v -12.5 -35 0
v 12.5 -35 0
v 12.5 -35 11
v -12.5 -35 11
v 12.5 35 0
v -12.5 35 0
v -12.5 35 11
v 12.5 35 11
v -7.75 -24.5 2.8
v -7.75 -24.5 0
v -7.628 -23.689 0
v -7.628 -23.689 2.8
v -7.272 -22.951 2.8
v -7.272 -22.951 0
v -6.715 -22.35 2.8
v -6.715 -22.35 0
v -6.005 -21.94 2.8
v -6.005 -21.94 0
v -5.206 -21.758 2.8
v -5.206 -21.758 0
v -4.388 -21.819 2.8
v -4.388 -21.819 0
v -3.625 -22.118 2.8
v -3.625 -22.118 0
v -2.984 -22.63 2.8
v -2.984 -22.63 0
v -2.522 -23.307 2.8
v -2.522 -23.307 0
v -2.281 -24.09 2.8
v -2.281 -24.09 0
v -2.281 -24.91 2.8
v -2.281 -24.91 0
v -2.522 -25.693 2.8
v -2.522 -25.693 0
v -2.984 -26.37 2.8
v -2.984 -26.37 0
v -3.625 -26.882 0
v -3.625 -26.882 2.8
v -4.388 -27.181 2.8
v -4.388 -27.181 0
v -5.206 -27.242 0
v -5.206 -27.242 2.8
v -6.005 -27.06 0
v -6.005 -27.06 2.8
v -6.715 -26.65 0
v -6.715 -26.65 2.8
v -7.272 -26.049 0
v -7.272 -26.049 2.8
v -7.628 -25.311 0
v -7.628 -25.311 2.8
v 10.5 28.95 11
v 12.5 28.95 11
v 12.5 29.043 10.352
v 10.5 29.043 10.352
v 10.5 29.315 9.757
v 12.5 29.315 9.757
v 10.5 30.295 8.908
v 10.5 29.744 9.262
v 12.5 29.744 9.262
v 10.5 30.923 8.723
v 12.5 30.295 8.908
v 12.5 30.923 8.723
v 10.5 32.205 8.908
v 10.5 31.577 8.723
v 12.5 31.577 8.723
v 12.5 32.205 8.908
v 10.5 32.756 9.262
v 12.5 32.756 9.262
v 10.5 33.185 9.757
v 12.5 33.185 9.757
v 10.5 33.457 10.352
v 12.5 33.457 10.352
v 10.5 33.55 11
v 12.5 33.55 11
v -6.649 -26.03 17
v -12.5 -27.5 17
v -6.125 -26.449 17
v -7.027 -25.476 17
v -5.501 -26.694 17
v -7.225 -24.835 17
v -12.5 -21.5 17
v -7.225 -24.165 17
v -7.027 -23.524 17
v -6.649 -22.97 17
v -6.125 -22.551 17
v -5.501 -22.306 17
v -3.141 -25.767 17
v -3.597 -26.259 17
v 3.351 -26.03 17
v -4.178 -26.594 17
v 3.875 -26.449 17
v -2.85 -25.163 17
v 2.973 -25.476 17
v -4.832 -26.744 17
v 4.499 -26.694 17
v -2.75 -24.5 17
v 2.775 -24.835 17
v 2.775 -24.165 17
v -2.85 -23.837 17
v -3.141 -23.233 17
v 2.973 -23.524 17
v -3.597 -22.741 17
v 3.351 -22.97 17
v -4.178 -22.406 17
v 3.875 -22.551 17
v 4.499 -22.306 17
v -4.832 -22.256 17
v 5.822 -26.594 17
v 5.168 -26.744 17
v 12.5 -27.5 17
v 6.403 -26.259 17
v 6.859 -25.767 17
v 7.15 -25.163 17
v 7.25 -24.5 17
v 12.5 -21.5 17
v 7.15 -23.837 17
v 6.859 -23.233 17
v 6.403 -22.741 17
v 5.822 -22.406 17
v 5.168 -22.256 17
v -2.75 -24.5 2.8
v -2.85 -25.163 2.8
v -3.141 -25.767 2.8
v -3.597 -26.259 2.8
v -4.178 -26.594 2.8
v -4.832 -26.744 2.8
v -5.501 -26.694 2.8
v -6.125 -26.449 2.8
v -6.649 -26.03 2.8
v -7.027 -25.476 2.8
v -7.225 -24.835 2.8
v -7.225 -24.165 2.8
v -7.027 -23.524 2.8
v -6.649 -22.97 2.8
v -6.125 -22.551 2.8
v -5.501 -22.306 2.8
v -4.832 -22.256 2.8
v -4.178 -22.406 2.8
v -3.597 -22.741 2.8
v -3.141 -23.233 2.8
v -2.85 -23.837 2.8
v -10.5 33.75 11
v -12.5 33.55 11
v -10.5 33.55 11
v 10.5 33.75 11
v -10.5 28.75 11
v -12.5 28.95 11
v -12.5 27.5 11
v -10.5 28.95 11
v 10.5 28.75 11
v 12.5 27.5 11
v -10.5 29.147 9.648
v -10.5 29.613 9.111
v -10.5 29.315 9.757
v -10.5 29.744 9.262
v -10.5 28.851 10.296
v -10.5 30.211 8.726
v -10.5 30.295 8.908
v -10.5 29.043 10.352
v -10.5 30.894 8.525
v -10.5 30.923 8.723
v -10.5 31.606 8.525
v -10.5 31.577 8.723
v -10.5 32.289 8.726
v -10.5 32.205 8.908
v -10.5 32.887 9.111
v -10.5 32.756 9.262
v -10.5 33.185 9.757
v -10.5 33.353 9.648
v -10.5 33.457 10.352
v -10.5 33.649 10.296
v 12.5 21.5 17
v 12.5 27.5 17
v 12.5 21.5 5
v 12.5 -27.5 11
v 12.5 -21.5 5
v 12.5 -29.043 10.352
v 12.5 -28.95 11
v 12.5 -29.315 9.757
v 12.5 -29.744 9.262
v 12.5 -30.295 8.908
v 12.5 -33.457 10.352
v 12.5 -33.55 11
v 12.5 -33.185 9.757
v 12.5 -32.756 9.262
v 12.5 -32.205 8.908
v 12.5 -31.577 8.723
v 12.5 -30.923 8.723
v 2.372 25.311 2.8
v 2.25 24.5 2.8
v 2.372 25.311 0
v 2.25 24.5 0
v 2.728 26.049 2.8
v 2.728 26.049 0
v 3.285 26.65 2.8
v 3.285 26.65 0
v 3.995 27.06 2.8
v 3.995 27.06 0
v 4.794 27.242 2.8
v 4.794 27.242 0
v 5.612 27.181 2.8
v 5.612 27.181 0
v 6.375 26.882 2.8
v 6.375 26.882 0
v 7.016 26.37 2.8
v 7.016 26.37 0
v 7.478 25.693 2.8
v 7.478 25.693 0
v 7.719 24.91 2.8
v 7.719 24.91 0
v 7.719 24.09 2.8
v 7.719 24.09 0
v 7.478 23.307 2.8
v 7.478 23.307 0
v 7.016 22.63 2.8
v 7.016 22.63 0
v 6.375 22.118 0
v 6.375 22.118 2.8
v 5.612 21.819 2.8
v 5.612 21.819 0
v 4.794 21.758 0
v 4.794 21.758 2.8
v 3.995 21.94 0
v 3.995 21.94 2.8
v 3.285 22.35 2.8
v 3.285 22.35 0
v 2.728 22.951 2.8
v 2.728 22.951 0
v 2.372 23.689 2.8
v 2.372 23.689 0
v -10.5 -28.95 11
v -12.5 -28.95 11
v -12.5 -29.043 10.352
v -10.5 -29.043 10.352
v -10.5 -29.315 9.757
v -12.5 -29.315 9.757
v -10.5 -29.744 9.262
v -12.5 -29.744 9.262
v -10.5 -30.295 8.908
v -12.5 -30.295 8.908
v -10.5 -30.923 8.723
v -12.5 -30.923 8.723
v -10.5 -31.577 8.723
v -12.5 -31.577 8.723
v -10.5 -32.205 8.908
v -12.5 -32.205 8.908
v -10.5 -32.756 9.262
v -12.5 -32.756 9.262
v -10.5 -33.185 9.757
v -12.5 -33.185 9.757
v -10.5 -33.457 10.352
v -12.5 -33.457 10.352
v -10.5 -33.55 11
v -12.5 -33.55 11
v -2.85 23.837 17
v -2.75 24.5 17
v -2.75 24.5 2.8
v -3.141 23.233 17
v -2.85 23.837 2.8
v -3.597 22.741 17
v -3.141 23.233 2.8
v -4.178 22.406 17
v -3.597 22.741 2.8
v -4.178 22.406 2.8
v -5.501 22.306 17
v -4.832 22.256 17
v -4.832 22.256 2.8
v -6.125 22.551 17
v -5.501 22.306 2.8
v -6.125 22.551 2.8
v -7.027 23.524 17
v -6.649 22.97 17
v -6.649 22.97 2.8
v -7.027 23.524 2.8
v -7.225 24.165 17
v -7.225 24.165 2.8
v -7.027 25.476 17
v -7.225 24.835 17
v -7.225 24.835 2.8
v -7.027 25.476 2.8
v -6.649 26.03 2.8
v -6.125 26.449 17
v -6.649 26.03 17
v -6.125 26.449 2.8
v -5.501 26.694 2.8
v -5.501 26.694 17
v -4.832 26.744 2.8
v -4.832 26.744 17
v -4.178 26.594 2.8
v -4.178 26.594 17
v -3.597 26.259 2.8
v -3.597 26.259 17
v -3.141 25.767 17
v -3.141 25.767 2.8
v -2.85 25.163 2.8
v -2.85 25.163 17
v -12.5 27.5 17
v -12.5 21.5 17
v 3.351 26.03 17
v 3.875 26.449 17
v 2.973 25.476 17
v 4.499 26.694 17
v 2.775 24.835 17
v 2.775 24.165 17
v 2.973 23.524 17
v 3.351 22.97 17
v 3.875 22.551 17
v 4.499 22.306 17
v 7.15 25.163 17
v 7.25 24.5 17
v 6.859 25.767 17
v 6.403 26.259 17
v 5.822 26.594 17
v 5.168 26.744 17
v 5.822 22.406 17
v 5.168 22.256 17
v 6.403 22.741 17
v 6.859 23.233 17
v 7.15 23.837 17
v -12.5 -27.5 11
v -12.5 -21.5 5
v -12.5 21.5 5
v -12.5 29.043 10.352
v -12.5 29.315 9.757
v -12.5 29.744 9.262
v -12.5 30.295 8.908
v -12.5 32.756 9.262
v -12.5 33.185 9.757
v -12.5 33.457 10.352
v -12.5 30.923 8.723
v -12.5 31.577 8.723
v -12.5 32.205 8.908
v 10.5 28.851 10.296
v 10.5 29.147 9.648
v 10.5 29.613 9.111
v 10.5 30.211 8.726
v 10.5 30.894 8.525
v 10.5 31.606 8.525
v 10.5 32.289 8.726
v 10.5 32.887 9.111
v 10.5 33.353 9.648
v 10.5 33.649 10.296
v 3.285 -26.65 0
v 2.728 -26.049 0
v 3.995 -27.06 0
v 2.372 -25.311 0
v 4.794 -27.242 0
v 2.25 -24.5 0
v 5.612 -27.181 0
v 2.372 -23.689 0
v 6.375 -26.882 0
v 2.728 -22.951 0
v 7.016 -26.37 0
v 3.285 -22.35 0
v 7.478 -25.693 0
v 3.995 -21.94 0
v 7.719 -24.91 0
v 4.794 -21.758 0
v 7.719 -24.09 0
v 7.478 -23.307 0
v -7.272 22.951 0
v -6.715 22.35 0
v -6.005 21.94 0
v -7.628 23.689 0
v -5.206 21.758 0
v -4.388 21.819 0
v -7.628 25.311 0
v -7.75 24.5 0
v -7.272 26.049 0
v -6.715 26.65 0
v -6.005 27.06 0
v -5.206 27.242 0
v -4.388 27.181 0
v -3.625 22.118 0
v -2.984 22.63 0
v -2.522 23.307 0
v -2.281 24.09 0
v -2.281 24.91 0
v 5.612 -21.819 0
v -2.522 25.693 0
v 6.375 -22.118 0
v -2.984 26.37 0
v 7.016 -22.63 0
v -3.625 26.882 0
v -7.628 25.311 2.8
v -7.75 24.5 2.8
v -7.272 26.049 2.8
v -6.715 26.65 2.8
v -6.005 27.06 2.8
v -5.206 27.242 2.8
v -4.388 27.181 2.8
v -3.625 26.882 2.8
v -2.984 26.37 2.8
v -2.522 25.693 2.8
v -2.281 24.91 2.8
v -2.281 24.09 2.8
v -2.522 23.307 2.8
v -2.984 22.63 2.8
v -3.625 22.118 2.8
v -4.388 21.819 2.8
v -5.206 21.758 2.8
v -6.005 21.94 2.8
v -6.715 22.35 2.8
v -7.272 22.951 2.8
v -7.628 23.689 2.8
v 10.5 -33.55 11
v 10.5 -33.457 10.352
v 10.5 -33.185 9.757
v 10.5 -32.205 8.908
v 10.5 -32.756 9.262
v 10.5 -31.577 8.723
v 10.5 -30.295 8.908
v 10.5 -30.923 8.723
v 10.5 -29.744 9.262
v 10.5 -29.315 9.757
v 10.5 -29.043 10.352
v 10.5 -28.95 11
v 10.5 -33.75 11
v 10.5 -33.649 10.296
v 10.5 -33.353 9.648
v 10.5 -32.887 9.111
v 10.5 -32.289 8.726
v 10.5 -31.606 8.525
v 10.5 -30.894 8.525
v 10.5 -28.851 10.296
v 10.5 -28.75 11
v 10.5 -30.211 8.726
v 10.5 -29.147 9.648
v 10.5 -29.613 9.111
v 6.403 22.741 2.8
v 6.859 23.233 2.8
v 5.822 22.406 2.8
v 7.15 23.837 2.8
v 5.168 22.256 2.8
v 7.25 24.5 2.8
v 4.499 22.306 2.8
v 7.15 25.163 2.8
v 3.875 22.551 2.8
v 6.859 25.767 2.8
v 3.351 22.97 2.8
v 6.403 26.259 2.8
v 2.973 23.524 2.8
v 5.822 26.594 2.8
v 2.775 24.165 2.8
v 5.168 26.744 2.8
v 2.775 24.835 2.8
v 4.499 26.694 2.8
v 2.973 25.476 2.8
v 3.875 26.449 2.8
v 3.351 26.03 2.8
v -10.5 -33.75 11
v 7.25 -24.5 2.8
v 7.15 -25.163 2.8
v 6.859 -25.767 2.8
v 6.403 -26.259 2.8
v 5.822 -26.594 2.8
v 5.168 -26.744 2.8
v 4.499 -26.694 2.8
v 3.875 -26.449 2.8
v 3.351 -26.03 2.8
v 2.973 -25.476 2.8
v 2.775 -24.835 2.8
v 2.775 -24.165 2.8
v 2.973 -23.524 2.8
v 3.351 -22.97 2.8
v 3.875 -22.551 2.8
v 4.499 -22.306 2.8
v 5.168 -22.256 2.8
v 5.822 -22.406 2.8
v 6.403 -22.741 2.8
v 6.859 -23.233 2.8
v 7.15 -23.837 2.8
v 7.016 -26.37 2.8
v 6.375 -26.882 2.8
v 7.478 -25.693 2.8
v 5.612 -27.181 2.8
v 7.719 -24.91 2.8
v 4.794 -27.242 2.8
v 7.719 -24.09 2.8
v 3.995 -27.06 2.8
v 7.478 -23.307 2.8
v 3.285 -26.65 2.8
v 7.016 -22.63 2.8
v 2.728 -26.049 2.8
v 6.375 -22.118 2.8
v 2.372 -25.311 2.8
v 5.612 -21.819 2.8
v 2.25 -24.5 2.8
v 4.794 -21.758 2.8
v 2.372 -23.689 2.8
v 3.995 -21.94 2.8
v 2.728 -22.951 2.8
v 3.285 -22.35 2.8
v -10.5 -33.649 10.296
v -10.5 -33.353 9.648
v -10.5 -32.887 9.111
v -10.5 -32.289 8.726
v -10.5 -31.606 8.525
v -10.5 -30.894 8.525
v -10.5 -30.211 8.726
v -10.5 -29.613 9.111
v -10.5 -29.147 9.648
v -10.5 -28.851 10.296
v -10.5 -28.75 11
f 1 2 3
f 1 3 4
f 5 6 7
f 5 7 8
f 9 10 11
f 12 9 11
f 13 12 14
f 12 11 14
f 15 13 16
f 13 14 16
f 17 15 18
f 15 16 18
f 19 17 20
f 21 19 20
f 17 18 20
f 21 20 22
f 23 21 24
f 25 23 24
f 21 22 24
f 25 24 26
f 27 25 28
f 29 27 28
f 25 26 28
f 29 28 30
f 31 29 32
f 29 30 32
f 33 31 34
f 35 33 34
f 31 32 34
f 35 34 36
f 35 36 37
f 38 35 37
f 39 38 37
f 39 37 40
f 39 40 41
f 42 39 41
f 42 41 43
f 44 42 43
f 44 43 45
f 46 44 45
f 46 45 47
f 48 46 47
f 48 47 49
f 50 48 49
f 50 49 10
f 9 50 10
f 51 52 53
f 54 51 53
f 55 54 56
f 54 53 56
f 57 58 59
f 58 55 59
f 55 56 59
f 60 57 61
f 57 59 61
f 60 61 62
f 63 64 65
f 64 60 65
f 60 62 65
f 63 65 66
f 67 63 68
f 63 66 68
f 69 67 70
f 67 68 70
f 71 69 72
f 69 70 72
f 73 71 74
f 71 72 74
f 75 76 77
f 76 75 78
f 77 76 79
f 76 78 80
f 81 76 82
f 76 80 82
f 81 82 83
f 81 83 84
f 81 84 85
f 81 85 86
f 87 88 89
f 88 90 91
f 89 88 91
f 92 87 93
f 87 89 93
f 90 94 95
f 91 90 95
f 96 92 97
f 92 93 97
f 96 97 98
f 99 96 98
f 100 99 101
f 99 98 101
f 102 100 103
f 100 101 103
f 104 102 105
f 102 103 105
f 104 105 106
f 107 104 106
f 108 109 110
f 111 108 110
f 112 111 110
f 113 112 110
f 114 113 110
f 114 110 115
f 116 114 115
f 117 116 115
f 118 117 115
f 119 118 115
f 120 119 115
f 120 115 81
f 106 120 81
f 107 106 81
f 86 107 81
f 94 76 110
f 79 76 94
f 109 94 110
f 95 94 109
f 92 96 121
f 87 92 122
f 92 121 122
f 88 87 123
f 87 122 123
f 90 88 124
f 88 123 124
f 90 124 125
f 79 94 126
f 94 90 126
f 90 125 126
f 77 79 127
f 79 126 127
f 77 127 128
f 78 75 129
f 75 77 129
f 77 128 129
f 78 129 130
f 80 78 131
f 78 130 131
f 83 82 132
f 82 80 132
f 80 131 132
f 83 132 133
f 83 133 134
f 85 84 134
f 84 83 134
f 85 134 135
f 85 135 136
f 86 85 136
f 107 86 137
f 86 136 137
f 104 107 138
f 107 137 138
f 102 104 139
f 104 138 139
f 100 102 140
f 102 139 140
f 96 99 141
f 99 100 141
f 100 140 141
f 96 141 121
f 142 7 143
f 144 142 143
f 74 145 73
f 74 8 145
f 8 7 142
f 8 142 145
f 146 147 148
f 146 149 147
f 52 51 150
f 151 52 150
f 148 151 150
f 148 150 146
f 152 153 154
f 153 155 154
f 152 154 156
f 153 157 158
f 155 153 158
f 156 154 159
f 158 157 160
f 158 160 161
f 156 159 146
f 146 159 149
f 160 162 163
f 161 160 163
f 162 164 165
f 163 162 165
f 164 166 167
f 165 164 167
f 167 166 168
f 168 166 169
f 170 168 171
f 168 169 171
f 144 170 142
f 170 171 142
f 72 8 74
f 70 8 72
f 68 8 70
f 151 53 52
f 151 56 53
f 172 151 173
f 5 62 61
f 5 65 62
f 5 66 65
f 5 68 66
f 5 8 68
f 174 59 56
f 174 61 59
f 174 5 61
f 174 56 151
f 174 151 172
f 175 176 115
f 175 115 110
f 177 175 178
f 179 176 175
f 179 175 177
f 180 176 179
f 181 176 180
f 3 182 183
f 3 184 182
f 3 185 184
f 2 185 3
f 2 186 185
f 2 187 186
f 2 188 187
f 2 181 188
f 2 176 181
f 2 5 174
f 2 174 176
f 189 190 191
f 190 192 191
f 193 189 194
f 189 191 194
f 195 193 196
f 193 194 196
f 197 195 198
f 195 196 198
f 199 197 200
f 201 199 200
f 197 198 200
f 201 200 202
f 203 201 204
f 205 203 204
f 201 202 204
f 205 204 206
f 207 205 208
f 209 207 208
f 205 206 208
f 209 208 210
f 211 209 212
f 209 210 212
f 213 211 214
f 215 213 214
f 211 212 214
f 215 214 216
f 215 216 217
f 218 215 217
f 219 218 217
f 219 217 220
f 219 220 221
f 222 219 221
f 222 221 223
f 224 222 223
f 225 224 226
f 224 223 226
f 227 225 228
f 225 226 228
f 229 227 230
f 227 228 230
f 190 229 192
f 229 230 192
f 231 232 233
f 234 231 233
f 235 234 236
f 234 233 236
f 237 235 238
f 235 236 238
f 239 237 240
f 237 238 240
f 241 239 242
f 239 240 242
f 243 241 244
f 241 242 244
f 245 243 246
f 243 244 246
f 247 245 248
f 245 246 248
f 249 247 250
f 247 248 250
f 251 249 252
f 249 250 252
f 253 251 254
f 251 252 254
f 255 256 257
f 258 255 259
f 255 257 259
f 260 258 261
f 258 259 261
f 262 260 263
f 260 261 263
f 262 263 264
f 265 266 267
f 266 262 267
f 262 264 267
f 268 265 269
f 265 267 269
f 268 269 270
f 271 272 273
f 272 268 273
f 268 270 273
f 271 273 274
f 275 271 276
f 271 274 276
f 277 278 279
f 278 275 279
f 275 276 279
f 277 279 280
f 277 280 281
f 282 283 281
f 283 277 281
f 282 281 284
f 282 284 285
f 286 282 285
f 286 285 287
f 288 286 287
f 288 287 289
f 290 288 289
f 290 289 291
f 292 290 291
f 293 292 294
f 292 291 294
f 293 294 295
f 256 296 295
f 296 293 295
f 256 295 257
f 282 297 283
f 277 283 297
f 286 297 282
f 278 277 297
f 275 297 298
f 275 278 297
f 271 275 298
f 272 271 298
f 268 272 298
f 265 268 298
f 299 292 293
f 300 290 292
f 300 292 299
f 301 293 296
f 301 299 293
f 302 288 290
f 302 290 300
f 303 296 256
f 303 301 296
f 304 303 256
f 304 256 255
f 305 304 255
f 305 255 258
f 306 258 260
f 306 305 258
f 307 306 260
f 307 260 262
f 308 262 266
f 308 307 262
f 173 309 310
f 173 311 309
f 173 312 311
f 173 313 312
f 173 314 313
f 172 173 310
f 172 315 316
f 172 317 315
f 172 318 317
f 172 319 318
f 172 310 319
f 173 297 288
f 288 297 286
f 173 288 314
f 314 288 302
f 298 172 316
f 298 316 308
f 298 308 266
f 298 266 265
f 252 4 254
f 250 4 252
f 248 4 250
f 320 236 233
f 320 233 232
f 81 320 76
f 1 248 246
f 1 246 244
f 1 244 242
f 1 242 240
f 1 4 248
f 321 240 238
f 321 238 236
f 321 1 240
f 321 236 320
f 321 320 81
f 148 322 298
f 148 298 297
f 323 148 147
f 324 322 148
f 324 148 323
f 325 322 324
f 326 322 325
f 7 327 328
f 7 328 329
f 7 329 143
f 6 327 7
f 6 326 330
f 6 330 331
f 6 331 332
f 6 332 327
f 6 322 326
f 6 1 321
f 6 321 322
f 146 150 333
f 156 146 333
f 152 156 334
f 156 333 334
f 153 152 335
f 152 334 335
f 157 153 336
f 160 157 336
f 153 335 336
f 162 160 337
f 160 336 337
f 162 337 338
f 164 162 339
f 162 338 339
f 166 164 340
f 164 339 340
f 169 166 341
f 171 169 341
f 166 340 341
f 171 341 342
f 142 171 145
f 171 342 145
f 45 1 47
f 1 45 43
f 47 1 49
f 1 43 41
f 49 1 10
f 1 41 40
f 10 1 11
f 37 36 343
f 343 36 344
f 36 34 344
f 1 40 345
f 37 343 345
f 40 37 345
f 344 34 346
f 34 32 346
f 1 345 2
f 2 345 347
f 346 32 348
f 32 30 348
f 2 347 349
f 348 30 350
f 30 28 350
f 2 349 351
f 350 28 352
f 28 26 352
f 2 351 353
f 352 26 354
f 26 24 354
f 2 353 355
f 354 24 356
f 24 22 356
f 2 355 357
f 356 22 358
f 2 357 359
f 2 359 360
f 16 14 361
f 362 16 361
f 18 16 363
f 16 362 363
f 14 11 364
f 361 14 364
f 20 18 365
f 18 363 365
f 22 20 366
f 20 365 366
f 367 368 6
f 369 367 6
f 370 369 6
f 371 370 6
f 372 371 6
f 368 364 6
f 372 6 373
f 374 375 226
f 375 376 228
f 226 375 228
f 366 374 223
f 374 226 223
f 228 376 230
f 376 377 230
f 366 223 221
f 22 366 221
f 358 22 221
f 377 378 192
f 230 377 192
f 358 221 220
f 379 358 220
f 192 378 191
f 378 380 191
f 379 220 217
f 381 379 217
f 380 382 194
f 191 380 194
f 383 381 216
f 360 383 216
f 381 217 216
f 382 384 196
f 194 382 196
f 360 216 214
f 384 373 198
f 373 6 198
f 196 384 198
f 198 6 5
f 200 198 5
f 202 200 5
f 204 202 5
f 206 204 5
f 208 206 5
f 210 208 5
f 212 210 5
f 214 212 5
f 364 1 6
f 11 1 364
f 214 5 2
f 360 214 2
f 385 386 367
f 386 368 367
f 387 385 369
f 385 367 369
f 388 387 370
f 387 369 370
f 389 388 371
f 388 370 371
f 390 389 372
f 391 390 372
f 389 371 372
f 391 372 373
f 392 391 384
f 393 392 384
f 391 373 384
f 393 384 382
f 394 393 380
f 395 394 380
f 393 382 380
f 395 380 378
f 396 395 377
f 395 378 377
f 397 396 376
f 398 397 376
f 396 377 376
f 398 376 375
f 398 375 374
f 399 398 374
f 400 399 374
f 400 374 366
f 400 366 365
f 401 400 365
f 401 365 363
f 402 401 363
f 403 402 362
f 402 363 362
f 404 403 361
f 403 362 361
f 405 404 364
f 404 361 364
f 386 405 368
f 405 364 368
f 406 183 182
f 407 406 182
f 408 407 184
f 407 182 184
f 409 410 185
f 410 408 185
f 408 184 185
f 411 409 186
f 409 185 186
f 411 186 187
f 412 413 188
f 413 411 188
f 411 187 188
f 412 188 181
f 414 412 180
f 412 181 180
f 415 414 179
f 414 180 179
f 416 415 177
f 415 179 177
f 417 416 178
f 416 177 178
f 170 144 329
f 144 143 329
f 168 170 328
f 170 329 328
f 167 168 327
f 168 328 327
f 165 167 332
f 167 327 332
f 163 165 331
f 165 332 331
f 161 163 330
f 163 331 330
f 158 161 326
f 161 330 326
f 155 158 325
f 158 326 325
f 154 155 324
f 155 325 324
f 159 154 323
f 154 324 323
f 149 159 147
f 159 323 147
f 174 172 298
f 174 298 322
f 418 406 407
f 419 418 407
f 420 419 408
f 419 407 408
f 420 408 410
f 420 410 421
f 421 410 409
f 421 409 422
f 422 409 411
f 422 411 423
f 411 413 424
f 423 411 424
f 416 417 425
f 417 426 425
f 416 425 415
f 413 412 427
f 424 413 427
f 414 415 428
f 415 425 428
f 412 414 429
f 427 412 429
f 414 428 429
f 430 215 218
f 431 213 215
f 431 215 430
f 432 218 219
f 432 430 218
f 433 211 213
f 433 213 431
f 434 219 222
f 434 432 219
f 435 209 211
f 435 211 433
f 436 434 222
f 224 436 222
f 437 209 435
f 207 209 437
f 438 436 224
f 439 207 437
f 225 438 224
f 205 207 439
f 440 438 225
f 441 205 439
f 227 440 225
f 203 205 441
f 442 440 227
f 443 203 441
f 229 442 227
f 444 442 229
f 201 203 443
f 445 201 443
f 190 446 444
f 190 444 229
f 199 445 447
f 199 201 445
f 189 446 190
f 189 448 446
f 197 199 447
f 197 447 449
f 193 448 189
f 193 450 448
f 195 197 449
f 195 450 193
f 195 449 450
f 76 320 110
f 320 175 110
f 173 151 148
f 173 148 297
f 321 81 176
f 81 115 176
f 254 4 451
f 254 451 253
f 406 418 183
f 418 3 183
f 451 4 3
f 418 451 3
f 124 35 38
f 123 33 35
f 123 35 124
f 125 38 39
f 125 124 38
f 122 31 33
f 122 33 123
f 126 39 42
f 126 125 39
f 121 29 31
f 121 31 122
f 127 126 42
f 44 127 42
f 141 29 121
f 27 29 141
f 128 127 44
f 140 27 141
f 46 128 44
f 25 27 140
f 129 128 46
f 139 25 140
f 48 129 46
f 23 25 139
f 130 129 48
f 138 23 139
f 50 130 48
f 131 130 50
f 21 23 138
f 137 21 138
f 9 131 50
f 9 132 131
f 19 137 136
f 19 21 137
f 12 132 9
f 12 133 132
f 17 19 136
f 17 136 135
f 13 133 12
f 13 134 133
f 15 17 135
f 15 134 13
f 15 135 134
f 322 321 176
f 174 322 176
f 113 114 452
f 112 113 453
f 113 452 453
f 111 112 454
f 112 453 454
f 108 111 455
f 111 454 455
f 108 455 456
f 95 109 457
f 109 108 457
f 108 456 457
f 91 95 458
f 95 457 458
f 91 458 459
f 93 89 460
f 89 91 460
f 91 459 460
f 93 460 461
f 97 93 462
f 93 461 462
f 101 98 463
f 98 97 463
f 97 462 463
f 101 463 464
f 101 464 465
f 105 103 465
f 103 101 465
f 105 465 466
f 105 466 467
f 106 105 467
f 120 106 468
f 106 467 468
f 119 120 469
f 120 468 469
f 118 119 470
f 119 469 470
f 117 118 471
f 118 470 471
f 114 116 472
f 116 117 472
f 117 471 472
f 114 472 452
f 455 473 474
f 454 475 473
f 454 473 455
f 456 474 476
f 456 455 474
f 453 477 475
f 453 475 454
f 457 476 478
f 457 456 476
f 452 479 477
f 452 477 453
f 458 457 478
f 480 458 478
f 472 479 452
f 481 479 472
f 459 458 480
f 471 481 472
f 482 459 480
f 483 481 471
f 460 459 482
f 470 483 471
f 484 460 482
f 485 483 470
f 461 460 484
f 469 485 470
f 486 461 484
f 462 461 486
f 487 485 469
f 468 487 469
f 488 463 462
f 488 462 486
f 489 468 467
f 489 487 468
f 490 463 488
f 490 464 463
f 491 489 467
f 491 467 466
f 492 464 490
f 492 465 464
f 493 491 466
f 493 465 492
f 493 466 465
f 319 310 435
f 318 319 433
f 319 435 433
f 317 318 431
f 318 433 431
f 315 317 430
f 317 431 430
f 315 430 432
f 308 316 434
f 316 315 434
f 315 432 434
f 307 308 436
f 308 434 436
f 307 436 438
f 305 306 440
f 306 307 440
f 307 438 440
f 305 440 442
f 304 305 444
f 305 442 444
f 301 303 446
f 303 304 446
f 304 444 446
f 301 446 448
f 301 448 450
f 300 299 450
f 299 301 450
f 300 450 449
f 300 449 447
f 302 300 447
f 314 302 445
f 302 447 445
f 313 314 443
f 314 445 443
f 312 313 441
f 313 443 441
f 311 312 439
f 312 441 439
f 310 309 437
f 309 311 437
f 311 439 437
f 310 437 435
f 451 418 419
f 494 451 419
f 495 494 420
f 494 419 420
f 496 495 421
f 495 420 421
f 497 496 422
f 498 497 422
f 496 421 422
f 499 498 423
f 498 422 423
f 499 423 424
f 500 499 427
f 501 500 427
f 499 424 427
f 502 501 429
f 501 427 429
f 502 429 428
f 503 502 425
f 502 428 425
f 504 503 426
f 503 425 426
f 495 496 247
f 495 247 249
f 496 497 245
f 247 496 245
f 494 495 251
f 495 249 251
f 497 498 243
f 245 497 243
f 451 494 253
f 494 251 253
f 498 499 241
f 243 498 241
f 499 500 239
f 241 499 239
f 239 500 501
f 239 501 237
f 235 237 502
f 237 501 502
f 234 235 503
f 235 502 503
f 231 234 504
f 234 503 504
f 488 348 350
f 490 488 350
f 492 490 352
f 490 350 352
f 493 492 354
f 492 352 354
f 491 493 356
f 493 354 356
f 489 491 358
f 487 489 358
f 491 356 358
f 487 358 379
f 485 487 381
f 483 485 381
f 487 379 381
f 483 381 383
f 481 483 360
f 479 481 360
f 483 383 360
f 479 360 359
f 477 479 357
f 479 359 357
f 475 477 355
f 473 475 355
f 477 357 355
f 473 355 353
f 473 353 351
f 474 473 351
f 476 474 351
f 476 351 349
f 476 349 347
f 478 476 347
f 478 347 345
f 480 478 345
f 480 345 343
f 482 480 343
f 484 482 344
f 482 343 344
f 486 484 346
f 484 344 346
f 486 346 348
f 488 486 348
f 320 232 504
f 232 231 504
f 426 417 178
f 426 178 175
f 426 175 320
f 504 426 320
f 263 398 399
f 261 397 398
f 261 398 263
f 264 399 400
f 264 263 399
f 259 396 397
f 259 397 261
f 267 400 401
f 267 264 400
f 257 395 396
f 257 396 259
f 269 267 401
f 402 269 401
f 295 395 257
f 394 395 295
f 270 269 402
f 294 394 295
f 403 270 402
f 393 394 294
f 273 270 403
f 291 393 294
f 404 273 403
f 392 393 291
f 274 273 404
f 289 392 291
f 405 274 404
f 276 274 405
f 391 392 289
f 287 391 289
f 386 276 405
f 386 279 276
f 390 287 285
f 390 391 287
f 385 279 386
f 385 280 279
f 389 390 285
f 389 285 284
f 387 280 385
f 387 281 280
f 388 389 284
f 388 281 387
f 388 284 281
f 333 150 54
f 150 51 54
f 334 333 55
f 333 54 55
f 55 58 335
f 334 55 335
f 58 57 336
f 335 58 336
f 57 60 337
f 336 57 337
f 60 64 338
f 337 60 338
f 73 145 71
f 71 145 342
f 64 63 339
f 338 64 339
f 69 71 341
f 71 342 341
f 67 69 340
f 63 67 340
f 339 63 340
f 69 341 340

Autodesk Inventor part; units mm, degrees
ref_plane "YZ Plane" through (0, 0, 0) normal (1, 0, 0) x (0, 1, 0)
ref_plane "XZ Plane" through (0, 0, 0) normal (0, 1, 0) x (-1, 0, 0)
ref_plane "XY Plane" through (0, 0, 0) normal (0, 0, 1) x (1, 0, 0)
sketch "Sketch1" plane through (0, 0, 0) normal (0, 0, 1) x (1, 0, 0)
  line L0 (12.5, -35) -> (-12.5, -35)
  line L1 (-12.5, -35) -> (-12.5, 35)
  line L2 (-12.5, 35) -> (12.5, 35)
  line L3 (12.5, 35) -> (12.5, -35)
  line L4 (12.5, -35) -> (-12.5, 35) construction
  line L5 (-12.5, -35) -> (12.5, 35) construction
  line L6 (5, -24.5) -> (-5, -24.5) construction
  line L7 (-5, -24.5) -> (-5, 24.5) construction
  line L8 (-5, 24.5) -> (5, 24.5) construction
  line L9 (5, 24.5) -> (5, -24.5) construction
  line L10 (5, -24.5) -> (-5, 24.5) construction
  line L11 (-5, -24.5) -> (5, 24.5) construction
  circle A0 centre (-5, 24.5) radius 2.25
  circle A1 centre (5, 24.5) radius 2.25
  circle A2 centre (5, -24.5) radius 2.25
  circle A3 centre (-5, -24.5) radius 2.25
  point P0 (0, 0)
  dimension "d0" = 4.5
  dimension "d1" = 10
  dimension "d2" = 49
  dimension "d3" = 25
  dimension "d4" = 70
extrude "Extrusion1" add sketch "Sketch1" along normal blind 5
sketch "Sketch2" plane through (12.5, -35, 0) normal (1, 0, 0) x (0, 0, -1)
  line L0 (-5, 70) -> (-11, 70)
  line L1 (-11, 70) -> (-11, 62.5)
  line L2 (-11, 62.5) -> (-5, 62.5)
  line L3 (-5, 62.5) -> (-5, 70)
  circle A0 centre (-11, 66.25) radius 2.5
  line L4 (2.8141, 35) -> (-33.1304, 35) construction
  line L5 (0, 0) -> (0, 70) projected
  line L6 (-5, 0) -> (-11, 0)
  line L7 (-11, 0) -> (-11, 7.5)
  line L8 (-11, 7.5) -> (-5, 7.5)
  line L9 (-5, 7.5) -> (-5, 0)
  circle A1 centre (-11, 3.75) radius 2.5
  line L10 (-5, 62.5) -> (-17, 62.5)
  line L11 (-17, 62.5) -> (-17, 56.5)
  line L12 (-17, 56.5) -> (-5, 56.5)
  line L13 (-5, 56.5) -> (-5, 62.5)
  line L14 (-5, 7.5) -> (-17, 7.5)
  line L15 (-17, 7.5) -> (-17, 13.5)
  line L16 (-17, 13.5) -> (-5, 13.5)
  line L17 (-5, 13.5) -> (-5, 7.5)
  circle A2 centre (-11, 66.25) radius 2.3
  circle A3 centre (-11, 3.75) radius 2.3
  point P0 (0, 35)
  point P1 (0, 35)
  point P2 (-11, 68.75)
  point P3 (-11, 63.75)
  point P4 (-11, 6.25)
  point P5 (-11, 1.25)
  point P6 (-11, 6.05)
  point P7 (-11, 1.45)
  point P8 (-11, 68.55)
  point P9 (-11, 63.95)
  dimension "d7" = 6
  dimension "d8" = 7.5
  dimension "d9" = 5
  dimension "d12" = 6
  dimension "d13" = 12
  dimension "d16" = 0.2
extrude "Extrusion2" add sketch "Sketch2" against normal up to surface (25 mm away) contours L3 L2 L1 A0 L0 | L13 L12 L11 L10 L2 | L6 L7 A1 L8 L9 | L8 L14 L15 L16 L17
extrude "Extrusion3" cut sketch "Sketch1" along normal up to surface (17 mm away) contours A0 | A1 | A2 | A3
extrude "Extrusion4" add sketch "Sketch2" against normal blind 2 contours A0 L1 A2 | L7 A3 A1 picked at (-9.3509, 68.0205) picked at (-8.6068, 3.394)
mirror "Mirror1" about plane through (0, 0, 0) normal (1, 0, 0) of "Extrusion4"
sketch "Sketch3" plane through (0, 0, 0) normal (0, 0, -1) x (-1, 0, 0)
  circle A0 centre (-5, 24.5) radius 2.75
  circle A1 centre (-5, 24.5) radius 2.25 projected
  line L0 (-5, 24.5) -> (-5, 16.1694) construction
  line L1 (-5, 24.5) -> (-0.8082, 24.5) construction
  circle A2 centre (-5, -24.5) radius 2.75
  circle A3 centre (5, 24.5) radius 2.75
  circle A4 centre (5, -24.5) radius 2.75
  circle A5 centre (5, 24.5) radius 2.25 projected
  circle A6 centre (5, -24.5) radius 2.25 projected
  circle A7 centre (-5, -24.5) radius 2.25 projected
  point P0 (0, 0)
  dimension "d19" = 5.5
  dimension "d22" = 49
  dimension "d25" = 10
extrude "Extrusion5" cut sketch "Sketch3" against normal blind 2.8
equation "\"d13\" = 2 * d7"
equation "\"d14\" = d2"
properties part number "Servo_mount_front"
